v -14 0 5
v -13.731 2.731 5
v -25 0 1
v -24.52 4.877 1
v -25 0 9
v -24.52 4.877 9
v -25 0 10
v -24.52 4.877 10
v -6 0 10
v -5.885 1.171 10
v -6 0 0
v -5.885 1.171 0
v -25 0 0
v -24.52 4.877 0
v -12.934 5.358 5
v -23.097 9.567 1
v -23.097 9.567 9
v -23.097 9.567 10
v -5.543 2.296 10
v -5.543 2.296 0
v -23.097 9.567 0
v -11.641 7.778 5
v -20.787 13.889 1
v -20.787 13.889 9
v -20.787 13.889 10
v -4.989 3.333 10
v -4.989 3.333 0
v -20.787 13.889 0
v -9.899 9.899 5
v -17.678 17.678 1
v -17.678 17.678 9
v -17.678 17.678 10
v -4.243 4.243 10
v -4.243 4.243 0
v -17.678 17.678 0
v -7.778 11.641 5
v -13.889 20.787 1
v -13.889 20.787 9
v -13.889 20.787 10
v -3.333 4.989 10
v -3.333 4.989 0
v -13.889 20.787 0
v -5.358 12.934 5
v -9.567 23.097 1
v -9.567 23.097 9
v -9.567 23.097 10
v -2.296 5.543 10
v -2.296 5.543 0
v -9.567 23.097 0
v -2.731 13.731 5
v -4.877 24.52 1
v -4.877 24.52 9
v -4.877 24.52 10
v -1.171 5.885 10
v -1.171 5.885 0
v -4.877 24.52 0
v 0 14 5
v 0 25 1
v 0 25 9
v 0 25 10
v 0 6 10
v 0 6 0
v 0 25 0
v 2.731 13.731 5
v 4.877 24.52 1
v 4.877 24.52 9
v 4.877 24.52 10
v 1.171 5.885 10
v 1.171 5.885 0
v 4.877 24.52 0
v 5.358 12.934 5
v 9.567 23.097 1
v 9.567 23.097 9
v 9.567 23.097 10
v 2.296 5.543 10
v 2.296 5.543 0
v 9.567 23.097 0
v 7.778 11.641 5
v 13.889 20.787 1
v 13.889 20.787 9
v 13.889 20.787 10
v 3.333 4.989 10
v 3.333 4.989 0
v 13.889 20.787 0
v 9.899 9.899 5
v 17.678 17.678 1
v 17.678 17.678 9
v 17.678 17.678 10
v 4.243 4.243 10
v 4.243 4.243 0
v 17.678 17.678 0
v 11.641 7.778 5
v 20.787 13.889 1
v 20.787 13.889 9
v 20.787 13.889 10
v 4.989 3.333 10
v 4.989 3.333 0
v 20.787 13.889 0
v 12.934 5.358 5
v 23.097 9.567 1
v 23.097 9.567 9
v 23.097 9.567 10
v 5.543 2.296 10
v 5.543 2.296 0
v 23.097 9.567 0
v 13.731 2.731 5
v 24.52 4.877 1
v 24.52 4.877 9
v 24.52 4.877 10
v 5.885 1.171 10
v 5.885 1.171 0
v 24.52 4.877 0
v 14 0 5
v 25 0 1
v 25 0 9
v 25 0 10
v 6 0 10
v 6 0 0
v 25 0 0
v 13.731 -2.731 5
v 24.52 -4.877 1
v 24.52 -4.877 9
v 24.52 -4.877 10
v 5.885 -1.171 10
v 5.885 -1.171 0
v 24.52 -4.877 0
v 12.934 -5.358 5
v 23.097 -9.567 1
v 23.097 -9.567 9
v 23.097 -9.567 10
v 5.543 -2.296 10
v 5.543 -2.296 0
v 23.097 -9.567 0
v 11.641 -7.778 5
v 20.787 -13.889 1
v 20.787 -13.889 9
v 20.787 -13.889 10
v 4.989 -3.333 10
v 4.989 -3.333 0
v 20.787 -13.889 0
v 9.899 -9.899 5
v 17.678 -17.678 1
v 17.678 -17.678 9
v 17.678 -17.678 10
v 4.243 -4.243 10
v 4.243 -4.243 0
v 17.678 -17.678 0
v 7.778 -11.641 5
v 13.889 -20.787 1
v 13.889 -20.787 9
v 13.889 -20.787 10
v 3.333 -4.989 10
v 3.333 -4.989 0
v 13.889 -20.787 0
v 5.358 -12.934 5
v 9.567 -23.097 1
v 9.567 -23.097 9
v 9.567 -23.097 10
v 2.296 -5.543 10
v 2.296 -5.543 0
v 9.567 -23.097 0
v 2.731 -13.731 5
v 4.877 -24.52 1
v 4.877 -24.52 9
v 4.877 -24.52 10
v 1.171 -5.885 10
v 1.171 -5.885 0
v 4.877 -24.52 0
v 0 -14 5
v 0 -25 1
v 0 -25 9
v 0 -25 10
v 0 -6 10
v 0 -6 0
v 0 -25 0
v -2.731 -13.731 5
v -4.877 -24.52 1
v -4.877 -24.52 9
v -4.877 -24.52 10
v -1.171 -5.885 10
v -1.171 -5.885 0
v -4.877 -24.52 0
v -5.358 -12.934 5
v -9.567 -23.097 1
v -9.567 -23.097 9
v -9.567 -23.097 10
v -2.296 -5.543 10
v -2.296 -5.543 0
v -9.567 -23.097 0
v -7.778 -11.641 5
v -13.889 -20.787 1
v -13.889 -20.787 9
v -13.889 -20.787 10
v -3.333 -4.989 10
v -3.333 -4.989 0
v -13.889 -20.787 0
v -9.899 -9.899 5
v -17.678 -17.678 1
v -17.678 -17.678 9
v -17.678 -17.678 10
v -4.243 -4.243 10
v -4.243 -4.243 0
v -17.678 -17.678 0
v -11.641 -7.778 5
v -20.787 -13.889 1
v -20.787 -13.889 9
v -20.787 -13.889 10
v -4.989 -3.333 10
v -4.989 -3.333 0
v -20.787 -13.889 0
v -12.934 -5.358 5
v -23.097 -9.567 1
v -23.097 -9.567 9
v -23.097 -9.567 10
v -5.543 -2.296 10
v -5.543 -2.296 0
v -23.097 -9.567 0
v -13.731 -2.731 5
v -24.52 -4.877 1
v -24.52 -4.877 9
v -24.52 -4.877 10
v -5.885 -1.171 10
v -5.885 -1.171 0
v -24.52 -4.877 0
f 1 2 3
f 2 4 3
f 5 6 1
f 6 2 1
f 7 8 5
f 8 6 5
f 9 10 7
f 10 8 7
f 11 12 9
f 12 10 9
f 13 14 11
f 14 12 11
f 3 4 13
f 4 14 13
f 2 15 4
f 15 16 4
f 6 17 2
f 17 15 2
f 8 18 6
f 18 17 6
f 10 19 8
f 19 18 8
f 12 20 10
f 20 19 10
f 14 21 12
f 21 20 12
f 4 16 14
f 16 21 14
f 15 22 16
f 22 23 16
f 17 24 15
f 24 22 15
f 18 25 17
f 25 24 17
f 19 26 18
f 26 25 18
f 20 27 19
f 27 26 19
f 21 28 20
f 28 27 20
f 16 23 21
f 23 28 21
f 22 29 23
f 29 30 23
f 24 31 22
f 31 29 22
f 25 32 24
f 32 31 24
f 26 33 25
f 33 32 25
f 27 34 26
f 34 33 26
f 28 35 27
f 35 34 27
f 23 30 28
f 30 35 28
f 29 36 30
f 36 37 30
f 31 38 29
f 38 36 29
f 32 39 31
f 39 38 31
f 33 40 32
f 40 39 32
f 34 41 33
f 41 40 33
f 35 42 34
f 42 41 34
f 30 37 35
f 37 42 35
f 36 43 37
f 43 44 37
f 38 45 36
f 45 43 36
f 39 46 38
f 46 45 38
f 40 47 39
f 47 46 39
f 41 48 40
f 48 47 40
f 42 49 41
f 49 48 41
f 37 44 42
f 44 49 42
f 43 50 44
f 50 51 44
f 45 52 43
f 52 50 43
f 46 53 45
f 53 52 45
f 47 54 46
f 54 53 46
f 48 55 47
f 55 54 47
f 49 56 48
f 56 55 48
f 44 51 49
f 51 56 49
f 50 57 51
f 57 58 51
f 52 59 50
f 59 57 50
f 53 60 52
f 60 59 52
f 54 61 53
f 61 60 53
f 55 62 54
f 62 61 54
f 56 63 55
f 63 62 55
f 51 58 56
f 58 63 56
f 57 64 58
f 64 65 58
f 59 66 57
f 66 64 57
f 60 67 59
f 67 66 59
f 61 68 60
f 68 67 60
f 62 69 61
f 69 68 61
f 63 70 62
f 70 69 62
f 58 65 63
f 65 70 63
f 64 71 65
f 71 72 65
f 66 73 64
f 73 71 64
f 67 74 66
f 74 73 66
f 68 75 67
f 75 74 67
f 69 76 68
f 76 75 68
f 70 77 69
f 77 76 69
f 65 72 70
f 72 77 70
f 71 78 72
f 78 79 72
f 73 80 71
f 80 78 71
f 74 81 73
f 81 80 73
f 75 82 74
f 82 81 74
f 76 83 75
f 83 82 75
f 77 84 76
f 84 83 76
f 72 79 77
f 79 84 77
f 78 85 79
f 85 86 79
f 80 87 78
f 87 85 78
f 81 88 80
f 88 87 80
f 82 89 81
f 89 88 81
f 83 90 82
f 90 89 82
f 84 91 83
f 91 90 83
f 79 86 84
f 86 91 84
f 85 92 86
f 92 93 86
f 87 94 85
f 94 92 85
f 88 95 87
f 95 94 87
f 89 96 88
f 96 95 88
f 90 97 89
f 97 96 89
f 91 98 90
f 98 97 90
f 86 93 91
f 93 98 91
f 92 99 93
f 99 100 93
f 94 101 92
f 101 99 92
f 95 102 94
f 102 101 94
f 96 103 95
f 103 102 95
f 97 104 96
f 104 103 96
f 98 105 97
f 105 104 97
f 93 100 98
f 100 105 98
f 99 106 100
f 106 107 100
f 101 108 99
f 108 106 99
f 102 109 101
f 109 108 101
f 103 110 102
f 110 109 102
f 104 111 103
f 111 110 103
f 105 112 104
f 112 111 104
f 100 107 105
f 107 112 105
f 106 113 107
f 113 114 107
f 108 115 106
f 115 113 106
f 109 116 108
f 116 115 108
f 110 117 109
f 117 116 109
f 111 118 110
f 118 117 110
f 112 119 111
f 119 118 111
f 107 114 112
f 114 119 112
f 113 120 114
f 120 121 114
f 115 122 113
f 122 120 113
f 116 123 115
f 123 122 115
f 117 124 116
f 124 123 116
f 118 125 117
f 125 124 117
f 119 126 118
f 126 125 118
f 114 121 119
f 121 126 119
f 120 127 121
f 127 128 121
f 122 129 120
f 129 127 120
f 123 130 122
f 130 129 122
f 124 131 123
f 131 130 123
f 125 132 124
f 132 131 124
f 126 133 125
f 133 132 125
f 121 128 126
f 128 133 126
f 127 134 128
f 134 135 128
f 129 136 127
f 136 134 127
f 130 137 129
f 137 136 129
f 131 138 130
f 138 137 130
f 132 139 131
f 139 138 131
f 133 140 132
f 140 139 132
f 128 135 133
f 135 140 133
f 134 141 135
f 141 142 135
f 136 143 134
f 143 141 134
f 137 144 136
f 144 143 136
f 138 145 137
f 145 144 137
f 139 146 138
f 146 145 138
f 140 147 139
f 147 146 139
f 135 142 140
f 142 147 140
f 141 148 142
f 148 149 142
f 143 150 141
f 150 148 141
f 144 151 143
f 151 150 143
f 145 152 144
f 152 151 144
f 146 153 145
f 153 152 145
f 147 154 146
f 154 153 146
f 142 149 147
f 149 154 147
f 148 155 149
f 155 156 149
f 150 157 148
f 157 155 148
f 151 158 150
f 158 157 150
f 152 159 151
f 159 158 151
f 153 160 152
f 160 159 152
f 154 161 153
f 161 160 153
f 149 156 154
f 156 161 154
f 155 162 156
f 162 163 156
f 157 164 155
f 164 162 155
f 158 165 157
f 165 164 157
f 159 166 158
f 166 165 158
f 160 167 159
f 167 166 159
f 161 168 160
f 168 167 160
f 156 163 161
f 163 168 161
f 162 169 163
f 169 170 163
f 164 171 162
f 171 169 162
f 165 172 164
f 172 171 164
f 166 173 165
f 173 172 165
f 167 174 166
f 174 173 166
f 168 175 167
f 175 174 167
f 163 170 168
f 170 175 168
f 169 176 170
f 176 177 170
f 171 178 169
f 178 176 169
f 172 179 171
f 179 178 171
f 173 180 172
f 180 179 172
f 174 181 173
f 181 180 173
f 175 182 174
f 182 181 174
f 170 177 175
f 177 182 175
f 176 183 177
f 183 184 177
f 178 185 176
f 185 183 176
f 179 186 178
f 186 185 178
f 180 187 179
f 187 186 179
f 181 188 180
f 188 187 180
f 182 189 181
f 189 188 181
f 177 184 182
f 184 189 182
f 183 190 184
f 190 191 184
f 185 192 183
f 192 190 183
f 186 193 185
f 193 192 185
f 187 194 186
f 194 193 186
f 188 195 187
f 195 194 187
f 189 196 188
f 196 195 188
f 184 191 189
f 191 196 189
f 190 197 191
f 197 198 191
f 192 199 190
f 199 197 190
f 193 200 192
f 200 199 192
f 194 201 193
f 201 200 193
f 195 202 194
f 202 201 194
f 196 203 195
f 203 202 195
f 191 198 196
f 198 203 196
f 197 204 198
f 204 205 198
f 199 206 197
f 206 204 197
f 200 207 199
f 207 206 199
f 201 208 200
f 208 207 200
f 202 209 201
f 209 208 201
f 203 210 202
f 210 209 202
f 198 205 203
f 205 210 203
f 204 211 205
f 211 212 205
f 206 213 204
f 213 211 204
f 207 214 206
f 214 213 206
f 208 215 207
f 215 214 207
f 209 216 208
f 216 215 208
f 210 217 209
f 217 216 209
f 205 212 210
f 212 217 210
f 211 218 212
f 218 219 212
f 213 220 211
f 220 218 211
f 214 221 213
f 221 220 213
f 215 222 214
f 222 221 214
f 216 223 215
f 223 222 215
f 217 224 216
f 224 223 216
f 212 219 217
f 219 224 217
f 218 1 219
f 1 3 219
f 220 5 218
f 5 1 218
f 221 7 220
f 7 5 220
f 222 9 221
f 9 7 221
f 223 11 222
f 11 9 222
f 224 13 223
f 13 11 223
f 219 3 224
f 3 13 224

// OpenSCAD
$fn = 32;

// ----------------------------------------------------------------------
// Revolved part: V-groove pulley R25
// ----------------------------------------------------------------------

// --- parameters (mm) ---
bore_r = 6;               // bore radius
rim_r = 25;               // rim radius
rim_t = 10;               // rim width
groove_r = 14;            // groove root radius
groove_w = 4;             // groove half width
revolve_angle = 360;      // revolve sweep, degrees
fit_tol = 0.1;            // declared fit tolerance (prompt contract)
free_tol = 0.5;           // declared free tolerance (prompt contract)

bore_d = 2 * bore_r;
rim_d = 2 * rim_r;
groove_d = 2 * groove_r;

profile = [[6, 0], [25, 0], [25, 1], [14, 5], [25, 9], [25, 10], [6, 10]];  // primary outline, 7 points, counter clockwise

// --- the one profile operation ---
rotate_extrude(angle = revolve_angle) polygon(points = profile);
